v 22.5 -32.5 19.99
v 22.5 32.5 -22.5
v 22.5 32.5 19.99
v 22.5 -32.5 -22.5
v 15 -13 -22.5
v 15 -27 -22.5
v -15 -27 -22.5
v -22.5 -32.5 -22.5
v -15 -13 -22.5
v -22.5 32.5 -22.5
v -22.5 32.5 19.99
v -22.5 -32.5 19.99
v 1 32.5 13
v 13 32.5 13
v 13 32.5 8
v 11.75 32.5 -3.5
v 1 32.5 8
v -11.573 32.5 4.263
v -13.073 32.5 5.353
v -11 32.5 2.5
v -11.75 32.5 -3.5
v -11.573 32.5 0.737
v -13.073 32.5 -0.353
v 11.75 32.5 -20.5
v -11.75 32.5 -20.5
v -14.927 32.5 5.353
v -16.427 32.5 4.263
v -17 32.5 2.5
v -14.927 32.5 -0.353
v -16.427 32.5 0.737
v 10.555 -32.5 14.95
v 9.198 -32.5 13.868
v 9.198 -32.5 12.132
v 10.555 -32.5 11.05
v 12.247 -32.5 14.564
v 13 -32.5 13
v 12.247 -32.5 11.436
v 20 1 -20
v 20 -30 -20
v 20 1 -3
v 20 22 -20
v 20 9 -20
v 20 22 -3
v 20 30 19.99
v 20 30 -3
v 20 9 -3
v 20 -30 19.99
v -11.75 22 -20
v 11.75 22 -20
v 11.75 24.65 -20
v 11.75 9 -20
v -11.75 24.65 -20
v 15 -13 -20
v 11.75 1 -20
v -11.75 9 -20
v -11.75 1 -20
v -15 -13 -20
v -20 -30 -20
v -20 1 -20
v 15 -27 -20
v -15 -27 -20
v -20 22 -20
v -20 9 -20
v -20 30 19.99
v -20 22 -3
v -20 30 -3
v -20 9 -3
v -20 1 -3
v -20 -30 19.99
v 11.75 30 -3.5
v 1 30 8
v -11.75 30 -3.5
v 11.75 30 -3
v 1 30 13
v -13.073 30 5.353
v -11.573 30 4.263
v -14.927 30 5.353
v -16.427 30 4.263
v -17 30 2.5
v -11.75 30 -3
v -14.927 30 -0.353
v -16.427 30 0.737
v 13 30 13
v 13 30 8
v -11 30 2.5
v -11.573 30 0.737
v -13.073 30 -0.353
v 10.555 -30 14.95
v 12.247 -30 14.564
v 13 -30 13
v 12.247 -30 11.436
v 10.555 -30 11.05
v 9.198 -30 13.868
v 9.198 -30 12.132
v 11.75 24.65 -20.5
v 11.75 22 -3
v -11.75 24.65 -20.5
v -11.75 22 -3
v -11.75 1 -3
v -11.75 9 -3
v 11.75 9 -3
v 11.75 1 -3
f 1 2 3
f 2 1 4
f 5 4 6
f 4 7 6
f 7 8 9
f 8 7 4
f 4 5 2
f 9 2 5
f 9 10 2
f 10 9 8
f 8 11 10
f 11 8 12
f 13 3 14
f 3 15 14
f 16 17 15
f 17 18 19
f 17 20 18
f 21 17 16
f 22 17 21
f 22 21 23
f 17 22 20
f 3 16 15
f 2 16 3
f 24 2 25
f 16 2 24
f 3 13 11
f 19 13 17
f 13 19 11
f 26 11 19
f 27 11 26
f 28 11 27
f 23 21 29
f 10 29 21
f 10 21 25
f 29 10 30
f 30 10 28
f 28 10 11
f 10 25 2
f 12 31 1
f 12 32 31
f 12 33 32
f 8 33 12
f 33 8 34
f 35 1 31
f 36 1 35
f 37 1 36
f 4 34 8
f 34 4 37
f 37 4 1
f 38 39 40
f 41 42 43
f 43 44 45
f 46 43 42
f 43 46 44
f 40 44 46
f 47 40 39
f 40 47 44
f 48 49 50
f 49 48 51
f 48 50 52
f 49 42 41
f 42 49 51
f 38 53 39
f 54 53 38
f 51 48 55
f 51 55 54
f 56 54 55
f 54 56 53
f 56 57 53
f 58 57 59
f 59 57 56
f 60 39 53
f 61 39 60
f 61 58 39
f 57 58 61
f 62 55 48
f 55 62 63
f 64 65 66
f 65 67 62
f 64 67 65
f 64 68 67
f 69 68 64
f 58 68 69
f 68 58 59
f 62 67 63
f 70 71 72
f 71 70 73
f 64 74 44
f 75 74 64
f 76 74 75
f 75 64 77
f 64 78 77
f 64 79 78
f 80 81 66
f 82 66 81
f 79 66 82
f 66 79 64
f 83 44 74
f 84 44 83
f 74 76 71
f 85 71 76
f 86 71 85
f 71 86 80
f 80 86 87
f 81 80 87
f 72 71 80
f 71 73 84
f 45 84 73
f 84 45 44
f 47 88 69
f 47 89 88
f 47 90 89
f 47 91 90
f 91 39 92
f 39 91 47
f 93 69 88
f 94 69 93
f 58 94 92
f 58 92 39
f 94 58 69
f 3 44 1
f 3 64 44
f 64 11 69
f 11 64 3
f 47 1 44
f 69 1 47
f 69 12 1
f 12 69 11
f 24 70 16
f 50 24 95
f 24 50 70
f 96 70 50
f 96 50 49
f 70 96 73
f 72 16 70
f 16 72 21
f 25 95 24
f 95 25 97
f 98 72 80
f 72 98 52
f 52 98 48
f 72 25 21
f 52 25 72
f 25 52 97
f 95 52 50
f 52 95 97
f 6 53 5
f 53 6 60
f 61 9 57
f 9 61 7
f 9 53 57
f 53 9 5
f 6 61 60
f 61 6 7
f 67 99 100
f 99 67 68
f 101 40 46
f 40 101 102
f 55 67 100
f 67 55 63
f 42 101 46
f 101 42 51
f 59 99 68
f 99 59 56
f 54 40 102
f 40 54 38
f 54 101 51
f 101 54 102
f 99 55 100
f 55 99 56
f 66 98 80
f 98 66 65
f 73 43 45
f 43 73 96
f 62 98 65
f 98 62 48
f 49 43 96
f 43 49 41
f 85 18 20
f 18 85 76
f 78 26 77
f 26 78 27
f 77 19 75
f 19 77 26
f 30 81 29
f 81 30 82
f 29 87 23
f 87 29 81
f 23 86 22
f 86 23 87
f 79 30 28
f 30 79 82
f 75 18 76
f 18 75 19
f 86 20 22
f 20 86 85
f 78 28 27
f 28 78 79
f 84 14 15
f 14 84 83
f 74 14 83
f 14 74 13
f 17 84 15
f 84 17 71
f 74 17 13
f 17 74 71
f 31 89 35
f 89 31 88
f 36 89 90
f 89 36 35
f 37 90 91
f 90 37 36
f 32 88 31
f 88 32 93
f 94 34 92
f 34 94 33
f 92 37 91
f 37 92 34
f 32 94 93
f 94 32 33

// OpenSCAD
module simpleCase($w, $h, $d) {
    
difference() {
    cube([$w+5,$h+5,$d+5], center=true);
    cube([$w,$h,$d], center=true);
    translate([0,0,$d-0.01]) {
        cube([$w+7,$h+7,$d], center=true);
    }
}

}

module main() {
difference() {
simpleCase(40,60,40);
translate([0,28.9,-12]) {cube([23.5,8.5,17], center=true);}
translate([0,-20,-18]) {
cube([30,14,10], center=true);
}
}
difference() {
translate([0,5,-12]) { cube([40,8,18],center=true); }
translate([0,5,-11.9]) { cube([23.5,8.5,18], center=true); }
}



difference() {
translate([0,26,-12]) { cube([40,8,18],center=true); }
translate([0,26.1,-11.9]) { cube([23.5,8.5,18], center=true); }
}
}

difference() {
    main();
translate([1,0,11]) {

translate([-15,25,-8.5]) {
rotate([90,0,0]) {cylinder(h=25,r1=3,r2=3,center=true);}
}

translate([0,28,-3]) {cube([12,7,5]);}
translate([10,-25,2]) {
rotate([90,0,0]) { cylinder(h=25,r1=2,r2=2,center=true); }
}
}
}
